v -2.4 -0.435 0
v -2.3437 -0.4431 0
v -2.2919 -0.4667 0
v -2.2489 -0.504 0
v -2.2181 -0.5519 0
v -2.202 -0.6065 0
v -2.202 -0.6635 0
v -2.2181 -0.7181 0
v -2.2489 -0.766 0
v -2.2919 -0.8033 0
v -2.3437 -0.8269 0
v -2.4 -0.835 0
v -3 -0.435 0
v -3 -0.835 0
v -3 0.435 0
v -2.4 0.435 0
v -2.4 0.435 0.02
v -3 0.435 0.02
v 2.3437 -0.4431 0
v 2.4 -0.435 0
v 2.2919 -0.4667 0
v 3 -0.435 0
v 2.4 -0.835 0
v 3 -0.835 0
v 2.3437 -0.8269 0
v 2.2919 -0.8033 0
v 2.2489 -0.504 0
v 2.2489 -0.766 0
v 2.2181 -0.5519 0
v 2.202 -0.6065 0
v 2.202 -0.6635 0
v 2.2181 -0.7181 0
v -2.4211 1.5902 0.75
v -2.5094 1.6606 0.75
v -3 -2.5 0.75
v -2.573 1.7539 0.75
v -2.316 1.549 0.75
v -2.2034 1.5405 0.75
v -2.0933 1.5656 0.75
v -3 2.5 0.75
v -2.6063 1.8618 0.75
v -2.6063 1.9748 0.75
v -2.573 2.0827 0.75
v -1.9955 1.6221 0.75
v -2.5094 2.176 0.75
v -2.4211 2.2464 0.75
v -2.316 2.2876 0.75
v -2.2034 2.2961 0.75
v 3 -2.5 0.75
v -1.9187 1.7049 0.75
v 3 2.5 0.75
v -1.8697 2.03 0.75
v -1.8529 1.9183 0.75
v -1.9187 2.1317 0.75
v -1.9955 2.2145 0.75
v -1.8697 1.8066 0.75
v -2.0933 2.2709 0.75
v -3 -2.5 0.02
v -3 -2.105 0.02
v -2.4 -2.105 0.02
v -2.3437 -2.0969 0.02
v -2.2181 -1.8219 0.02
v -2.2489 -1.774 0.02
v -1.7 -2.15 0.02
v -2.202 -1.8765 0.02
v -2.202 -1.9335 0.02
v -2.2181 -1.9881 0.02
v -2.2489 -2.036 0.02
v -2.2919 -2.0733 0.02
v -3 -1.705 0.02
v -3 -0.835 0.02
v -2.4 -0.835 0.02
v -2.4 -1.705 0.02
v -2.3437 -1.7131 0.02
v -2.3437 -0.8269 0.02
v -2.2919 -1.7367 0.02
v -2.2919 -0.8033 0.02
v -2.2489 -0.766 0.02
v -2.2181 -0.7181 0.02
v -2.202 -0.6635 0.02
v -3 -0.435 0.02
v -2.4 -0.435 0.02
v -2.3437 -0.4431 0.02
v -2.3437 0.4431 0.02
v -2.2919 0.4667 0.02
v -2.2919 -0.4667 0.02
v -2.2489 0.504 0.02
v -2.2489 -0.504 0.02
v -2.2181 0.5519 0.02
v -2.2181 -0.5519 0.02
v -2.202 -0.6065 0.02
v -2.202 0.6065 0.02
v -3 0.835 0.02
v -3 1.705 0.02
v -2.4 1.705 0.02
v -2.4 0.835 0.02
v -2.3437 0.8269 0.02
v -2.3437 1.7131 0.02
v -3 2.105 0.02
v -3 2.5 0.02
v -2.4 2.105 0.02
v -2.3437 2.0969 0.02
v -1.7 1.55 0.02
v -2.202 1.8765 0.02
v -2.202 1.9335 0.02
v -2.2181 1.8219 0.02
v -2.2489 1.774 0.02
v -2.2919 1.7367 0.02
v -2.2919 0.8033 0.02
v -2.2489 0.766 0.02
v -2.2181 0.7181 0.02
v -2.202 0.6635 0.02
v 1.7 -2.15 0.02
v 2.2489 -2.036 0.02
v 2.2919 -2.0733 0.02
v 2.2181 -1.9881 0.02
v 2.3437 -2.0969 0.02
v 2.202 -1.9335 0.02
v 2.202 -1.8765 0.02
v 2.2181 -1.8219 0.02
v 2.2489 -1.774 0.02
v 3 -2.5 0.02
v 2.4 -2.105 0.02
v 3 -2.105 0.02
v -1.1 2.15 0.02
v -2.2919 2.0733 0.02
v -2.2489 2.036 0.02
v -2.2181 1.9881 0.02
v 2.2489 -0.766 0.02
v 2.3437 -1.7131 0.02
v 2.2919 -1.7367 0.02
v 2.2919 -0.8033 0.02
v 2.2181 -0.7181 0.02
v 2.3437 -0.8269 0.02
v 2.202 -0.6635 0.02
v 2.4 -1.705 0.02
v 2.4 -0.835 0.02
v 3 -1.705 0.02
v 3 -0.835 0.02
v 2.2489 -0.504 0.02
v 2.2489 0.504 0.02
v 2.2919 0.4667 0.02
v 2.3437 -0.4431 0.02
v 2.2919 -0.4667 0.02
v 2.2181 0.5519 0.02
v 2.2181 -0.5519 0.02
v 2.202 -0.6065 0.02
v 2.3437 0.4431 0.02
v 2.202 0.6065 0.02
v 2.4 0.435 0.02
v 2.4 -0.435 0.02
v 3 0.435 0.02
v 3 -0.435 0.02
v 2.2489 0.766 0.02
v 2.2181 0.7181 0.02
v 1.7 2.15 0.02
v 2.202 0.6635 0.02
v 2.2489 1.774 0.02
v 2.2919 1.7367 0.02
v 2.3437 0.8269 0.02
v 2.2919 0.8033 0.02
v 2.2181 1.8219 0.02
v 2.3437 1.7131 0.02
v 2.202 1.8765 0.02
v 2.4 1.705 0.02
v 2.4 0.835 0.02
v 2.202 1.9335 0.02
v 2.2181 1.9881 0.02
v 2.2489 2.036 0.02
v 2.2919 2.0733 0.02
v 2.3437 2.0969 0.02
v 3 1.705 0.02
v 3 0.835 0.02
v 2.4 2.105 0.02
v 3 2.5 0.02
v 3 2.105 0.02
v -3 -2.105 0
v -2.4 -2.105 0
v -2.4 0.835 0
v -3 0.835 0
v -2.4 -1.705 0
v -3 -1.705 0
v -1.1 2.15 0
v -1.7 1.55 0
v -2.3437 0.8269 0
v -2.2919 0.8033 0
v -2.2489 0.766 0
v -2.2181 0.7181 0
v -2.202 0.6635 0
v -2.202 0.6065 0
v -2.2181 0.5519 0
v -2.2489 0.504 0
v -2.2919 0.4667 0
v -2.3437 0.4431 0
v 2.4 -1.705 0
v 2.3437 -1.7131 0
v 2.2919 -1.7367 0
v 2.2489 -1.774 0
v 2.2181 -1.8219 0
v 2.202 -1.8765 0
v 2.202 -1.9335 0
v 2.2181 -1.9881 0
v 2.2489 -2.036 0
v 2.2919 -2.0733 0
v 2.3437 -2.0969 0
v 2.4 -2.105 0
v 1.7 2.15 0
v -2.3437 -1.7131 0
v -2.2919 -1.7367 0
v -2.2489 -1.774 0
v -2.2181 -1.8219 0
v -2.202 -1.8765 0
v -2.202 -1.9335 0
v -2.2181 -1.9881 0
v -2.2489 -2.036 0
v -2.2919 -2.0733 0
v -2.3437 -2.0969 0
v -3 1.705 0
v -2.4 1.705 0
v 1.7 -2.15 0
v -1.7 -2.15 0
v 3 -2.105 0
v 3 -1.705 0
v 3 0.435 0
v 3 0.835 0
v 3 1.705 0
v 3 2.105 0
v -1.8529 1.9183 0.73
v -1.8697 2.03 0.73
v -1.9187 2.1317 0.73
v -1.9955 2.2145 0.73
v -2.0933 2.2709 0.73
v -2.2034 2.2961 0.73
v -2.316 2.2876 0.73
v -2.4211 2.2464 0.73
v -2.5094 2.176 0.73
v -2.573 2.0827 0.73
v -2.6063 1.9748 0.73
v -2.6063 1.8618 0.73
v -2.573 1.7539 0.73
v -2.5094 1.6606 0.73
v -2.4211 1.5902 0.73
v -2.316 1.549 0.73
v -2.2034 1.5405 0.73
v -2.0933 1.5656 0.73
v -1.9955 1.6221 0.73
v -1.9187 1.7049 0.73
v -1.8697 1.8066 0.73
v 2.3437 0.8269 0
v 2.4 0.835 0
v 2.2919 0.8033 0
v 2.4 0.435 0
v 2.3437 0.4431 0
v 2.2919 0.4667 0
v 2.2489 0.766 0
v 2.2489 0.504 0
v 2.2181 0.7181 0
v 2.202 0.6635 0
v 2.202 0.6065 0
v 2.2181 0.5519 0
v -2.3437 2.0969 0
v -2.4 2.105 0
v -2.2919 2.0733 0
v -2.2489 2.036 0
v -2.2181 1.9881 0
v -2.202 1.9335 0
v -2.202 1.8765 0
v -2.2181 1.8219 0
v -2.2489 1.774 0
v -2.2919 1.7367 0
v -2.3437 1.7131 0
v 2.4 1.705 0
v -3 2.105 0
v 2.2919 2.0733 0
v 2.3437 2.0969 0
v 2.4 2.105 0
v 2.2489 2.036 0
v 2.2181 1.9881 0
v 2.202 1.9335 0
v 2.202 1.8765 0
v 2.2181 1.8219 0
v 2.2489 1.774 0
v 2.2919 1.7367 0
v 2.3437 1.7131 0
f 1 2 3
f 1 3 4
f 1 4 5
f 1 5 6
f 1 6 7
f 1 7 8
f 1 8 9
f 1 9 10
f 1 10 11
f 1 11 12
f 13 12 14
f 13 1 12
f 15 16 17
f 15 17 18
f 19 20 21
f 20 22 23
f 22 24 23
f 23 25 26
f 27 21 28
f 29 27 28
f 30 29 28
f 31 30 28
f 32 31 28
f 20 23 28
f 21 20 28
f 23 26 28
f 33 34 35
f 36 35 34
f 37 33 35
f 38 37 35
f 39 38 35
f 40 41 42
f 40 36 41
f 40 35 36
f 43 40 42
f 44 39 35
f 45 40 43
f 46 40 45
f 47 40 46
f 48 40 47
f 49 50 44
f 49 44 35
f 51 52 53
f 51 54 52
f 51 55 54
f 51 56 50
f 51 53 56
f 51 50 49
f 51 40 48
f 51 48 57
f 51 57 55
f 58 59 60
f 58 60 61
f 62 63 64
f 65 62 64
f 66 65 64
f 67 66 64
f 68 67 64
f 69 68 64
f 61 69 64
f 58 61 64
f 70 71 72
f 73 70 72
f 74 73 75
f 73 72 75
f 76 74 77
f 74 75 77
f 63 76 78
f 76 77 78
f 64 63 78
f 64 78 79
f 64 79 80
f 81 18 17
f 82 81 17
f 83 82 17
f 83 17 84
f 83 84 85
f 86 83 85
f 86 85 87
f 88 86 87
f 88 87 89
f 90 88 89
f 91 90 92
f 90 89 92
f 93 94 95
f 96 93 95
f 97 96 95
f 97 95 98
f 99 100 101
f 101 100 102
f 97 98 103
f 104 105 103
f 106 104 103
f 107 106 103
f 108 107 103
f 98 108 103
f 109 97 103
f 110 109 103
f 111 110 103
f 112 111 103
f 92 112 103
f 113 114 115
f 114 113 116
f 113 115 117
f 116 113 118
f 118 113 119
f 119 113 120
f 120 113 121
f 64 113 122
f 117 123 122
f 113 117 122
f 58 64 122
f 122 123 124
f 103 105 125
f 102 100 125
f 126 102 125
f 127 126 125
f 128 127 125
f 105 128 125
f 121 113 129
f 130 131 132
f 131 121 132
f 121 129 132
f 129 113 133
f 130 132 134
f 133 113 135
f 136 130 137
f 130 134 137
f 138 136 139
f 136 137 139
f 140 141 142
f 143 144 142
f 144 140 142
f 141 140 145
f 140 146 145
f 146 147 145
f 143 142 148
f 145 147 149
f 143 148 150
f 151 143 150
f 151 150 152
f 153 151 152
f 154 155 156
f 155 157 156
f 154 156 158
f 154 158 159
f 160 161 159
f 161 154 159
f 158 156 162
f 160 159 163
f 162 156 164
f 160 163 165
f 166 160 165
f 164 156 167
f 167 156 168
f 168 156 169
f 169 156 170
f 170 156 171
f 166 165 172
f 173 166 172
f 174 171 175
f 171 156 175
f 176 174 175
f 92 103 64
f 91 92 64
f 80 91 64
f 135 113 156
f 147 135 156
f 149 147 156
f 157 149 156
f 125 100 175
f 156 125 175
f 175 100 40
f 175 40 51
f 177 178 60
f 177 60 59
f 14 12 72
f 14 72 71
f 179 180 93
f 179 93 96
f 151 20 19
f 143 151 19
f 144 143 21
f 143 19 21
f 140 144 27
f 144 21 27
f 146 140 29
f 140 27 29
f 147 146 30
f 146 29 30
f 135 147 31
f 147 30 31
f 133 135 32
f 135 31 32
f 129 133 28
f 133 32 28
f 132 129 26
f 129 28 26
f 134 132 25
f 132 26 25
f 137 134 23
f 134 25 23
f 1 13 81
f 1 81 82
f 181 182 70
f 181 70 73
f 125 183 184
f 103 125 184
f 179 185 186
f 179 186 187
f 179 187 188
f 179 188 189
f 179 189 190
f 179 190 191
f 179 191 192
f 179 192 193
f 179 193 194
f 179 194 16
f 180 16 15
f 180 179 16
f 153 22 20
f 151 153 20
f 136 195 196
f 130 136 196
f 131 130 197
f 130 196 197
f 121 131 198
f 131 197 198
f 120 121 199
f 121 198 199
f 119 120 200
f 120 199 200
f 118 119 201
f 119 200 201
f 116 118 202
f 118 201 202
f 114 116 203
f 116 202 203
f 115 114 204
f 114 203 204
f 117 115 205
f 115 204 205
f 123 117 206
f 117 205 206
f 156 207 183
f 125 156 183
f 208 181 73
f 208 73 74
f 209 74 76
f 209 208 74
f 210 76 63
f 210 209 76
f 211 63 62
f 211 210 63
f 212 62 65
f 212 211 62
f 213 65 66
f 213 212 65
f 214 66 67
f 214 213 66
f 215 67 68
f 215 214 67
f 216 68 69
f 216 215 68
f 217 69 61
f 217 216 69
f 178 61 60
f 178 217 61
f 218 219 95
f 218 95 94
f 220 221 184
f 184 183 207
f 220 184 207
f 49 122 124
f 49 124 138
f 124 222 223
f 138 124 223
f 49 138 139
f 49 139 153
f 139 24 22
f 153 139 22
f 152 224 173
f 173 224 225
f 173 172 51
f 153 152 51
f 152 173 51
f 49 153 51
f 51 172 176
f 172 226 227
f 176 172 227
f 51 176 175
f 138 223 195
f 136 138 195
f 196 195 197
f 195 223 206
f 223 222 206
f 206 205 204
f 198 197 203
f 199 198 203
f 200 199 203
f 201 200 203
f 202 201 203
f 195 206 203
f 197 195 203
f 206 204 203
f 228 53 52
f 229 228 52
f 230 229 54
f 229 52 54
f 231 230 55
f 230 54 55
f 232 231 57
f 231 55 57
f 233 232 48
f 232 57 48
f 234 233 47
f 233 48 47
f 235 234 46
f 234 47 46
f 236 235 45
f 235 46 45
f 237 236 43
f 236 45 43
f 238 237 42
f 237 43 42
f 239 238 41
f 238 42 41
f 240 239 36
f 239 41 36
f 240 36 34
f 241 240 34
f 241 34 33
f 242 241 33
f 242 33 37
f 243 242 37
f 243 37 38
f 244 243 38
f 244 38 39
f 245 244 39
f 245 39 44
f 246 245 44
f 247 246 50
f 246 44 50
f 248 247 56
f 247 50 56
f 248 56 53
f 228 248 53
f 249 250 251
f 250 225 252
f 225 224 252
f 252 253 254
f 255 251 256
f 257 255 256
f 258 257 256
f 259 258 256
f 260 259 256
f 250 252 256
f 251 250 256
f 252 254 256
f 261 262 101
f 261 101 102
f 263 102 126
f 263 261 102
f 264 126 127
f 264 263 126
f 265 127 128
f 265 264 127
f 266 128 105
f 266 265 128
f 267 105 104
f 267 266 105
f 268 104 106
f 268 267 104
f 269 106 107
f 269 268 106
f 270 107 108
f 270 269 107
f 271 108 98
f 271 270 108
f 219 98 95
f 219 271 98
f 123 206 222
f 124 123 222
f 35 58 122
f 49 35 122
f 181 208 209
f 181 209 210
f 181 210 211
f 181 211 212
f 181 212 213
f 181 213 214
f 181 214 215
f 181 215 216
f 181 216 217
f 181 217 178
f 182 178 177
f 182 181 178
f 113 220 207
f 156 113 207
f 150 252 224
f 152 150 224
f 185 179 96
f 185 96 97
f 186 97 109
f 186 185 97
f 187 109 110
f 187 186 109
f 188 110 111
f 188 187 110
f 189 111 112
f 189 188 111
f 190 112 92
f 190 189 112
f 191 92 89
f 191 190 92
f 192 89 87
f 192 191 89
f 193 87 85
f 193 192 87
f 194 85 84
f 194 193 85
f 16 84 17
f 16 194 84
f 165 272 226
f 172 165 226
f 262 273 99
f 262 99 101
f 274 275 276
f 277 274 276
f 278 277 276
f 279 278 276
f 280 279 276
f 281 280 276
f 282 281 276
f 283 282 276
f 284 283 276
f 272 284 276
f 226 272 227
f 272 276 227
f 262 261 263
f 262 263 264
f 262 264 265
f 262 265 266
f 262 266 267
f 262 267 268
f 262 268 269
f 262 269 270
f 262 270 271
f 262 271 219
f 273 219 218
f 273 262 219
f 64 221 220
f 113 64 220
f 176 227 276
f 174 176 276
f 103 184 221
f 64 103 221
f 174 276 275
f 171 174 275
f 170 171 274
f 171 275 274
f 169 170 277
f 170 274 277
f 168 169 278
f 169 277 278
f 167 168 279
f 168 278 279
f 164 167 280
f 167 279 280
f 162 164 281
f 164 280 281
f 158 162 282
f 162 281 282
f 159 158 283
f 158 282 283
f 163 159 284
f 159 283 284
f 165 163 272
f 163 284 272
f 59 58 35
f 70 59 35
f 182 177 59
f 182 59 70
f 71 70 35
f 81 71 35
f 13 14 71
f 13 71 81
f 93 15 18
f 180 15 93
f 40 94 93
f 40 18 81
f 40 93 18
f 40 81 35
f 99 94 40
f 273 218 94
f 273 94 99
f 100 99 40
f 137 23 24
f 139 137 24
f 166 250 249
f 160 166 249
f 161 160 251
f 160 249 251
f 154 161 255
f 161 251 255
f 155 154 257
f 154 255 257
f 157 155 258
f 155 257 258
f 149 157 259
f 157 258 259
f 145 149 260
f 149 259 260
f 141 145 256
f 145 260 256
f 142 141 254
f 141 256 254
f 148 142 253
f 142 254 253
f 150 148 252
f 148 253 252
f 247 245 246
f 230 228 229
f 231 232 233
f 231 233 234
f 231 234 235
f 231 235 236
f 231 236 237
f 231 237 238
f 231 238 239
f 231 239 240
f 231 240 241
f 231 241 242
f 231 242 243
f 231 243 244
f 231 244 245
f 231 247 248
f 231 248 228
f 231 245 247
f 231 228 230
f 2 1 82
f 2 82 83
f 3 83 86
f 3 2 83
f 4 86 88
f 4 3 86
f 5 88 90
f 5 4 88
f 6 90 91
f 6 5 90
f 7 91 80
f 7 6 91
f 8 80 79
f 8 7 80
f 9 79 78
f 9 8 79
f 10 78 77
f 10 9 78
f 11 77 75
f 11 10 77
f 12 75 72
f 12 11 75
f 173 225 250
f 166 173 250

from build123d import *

# Parameters (mm, degrees)
BOSS_EXTRUDE1_START  = 0.02
SKETCH1_W            = 6
SKETCH1_H            = 5
BOSS_EXTRUDE1_DEPTH  = 0.73
BOSS_EXTRUDE2_DEPTH  = 0.02
BOSS_EXTRUDE3_DEPTH  = 0.02
LPATTERN1_COUNT      = 4
LPATTERN1_PITCH      = 1.27
MIRROR1_COPY_1_DEPTH = 0.02
MIRROR1_COPY_2_DEPTH = 0.02
MIRROR1_COPY_3_DEPTH = 0.02
SKETCH4_R            = 0.378837043
CUT_EXTRUDE1_DEPTH   = 0.02


with BuildPart() as part:
    # Sketch1 → Boss-Extrude1 (new body)
    with BuildSketch(Plane.XY.offset(BOSS_EXTRUDE1_START)):
        Rectangle(SKETCH1_W, SKETCH1_H)
    extrude(amount=BOSS_EXTRUDE1_DEPTH)

    # Sketch2 → Boss-Extrude2 (add)
    with BuildSketch(Plane.XY):
        Polygon((-1.7, -2.15), (1.7, -2.15), (1.7, 2.15), (-1.1, 2.15), (-1.7, 1.55), align=None)
    extrude(amount=BOSS_EXTRUDE2_DEPTH)

    # Sketch3 → Boss-Extrude3 (add)
    with BuildSketch(Plane.XY):
        with BuildLine():
            Line((-3, 2.105), (-2.4, 2.105))
            ThreePointArc((-2.4, 2.105), (-2.2, 1.905), (-2.4, 1.705))
            Line((-2.4, 1.705), (-3, 1.705))
            Line((-3, 1.705), (-3, 2.105))
        make_face()
    boss_extrude3 = extrude(amount=BOSS_EXTRUDE3_DEPTH)

    # LPattern1: Boss-Extrude3 ×4
    with Locations(*[(0, -i * LPATTERN1_PITCH, 0) for i in range(1, LPATTERN1_COUNT)]):
        add(boss_extrude3)

    # Mirror1: Boss-Extrude3 across plane
    add(boss_extrude3.mirror(Plane(origin=(0, 0, 0), x_dir=(0, 0, 1), z_dir=(1, 0, 0))))

    # Mirror1 copy 1 sketch → Mirror1 copy 1 (add)
    with BuildSketch(Plane(origin=(0, -1.27, 0), x_dir=(-1, 0, 0), z_dir=(0, 0, 1))):
        with BuildLine():
            Line((-3, -2.105), (-2.4, -2.105))
            ThreePointArc((-2.4, -2.105), (-2.2, -1.905), (-2.4, -1.705))
            Line((-2.4, -1.705), (-3, -1.705))
            Line((-3, -1.705), (-3, -2.105))
        make_face()
    extrude(amount=MIRROR1_COPY_1_DEPTH)

    # Mirror1 copy 2 sketch → Mirror1 copy 2 (add)
    with BuildSketch(Plane(origin=(0, -2.54, 0), x_dir=(-1, 0, 0), z_dir=(0, 0, 1))):
        with BuildLine():
            Line((-3, -2.105), (-2.4, -2.105))
            ThreePointArc((-2.4, -2.105), (-2.2, -1.905), (-2.4, -1.705))
            Line((-2.4, -1.705), (-3, -1.705))
            Line((-3, -1.705), (-3, -2.105))
        make_face()
    extrude(amount=MIRROR1_COPY_2_DEPTH)

    # Mirror1 copy 3 sketch → Mirror1 copy 3 (add)
    with BuildSketch(Plane(origin=(0, -3.81, 0), x_dir=(-1, 0, 0), z_dir=(0, 0, 1))):
        with BuildLine():
            Line((-3, -2.105), (-2.4, -2.105))
            ThreePointArc((-2.4, -2.105), (-2.2, -1.905), (-2.4, -1.705))
            Line((-2.4, -1.705), (-3, -1.705))
            Line((-3, -1.705), (-3, -2.105))
        make_face()
    extrude(amount=MIRROR1_COPY_3_DEPTH)

    # Sketch4 → Cut-Extrude1 (cut)
    with BuildSketch(Plane.XY.offset(0.75)):
        with Locations((-2.231694583, 1.918293029)):
            Circle(SKETCH4_R)
    extrude(amount=-CUT_EXTRUDE1_DEPTH, mode=Mode.SUBTRACT)


solid = part.part
